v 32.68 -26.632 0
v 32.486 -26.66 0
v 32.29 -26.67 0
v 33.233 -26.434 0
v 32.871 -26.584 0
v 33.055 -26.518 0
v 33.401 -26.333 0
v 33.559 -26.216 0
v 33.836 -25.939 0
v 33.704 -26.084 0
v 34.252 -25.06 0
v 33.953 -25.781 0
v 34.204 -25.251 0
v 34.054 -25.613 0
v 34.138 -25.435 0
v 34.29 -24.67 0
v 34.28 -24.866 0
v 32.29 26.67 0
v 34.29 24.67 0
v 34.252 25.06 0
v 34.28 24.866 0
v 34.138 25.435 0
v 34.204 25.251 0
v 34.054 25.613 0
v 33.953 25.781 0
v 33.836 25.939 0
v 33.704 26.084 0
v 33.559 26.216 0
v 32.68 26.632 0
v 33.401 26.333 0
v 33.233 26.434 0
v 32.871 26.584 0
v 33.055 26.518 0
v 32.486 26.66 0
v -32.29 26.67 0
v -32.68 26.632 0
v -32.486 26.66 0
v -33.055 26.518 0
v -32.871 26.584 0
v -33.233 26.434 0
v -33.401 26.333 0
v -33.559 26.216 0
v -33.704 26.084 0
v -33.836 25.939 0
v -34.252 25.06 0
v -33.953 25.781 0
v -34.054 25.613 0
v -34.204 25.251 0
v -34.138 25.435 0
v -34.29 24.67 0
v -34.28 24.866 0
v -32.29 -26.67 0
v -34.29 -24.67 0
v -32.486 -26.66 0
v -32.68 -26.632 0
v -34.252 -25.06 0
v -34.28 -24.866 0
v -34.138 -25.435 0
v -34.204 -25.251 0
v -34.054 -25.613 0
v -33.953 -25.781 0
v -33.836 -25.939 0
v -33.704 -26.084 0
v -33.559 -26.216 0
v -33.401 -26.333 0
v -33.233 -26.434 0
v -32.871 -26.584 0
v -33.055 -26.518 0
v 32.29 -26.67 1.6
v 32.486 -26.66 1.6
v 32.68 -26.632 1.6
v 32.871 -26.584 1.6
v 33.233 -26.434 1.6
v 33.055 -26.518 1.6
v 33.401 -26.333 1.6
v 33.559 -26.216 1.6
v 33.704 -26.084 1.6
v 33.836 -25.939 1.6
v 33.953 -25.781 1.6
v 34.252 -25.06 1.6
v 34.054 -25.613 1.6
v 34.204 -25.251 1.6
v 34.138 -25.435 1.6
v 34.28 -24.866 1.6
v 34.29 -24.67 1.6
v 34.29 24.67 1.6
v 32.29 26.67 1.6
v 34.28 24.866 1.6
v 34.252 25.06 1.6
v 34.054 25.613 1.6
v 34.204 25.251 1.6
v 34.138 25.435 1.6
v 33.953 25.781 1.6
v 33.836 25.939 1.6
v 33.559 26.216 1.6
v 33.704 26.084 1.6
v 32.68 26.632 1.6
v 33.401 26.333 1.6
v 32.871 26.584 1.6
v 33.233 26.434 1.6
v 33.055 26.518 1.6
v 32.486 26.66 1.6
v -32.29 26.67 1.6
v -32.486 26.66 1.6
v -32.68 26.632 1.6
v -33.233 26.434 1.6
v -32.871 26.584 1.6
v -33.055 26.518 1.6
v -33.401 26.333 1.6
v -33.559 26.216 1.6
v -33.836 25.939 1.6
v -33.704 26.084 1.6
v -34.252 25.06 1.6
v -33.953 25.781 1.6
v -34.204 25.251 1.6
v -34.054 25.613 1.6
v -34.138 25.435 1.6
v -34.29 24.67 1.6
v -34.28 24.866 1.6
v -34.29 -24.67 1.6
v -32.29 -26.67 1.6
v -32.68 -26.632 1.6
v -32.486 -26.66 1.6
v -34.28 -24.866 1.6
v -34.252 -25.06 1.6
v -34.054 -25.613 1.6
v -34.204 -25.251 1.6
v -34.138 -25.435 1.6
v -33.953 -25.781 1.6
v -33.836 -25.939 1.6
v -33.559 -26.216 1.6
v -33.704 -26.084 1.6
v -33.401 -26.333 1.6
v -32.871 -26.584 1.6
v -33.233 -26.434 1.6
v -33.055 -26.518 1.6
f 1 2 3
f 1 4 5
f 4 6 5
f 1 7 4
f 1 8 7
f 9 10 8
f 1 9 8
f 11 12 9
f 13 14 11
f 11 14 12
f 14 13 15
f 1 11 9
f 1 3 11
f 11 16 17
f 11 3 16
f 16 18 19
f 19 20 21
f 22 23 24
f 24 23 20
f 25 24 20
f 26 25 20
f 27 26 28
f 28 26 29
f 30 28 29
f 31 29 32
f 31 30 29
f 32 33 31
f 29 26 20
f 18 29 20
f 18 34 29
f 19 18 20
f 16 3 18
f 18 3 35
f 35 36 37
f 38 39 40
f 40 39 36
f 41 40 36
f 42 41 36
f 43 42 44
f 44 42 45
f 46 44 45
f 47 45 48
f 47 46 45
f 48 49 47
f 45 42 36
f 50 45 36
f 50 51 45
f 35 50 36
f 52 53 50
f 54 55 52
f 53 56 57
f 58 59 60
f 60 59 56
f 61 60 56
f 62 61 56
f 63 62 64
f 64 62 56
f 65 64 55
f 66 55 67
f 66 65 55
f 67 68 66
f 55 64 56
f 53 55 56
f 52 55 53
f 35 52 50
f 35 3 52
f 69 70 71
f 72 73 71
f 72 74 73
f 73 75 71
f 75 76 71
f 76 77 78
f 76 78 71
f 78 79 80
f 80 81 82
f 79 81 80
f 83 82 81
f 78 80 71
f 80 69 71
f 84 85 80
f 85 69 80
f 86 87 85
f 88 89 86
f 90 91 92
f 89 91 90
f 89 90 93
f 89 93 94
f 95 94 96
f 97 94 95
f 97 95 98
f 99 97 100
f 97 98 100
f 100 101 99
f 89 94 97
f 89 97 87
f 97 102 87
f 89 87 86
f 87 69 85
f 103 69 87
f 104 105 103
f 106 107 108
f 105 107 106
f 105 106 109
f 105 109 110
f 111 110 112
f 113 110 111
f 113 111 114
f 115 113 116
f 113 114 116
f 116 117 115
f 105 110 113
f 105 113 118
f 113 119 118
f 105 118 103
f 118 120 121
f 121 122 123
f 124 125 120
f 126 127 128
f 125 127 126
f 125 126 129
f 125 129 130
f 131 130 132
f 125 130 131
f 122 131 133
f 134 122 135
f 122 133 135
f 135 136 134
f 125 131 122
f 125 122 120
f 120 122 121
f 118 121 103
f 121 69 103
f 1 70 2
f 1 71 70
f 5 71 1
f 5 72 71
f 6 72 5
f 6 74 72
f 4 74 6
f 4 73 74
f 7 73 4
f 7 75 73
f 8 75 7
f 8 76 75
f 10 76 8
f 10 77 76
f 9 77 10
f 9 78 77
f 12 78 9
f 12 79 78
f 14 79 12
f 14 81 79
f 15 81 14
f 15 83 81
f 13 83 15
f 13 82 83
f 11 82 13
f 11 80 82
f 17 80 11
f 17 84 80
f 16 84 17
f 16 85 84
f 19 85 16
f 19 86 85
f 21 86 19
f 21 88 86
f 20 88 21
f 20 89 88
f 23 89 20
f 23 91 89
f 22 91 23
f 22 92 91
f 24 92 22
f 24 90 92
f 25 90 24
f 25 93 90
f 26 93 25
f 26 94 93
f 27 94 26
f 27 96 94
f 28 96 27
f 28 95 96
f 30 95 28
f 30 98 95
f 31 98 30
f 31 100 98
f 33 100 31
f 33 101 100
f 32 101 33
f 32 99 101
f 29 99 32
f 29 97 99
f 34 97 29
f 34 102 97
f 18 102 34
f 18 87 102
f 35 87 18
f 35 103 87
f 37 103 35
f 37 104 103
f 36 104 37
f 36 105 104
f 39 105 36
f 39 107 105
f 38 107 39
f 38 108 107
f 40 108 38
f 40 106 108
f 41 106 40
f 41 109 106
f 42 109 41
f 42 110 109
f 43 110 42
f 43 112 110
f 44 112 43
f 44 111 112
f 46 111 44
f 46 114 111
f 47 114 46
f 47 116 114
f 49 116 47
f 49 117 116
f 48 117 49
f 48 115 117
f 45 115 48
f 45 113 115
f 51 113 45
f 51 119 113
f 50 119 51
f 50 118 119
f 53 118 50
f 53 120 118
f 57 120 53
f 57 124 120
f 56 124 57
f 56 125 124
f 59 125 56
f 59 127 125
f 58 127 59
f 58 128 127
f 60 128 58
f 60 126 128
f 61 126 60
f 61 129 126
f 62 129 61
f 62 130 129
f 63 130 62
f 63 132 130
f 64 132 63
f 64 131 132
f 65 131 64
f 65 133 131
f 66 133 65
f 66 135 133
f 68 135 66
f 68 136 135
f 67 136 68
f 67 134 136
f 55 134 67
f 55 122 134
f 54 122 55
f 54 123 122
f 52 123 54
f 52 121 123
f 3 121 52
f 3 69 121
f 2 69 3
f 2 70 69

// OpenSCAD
$fn = 64;

board_x = 68.58;
board_y = 53.34;
board_th = 1.6;

module dev_board(x=board_x, y=board_y, th=board_th, corner_r=2.0) {
    linear_extrude(height=th)
        offset(r=corner_r)
            square([x - 2*corner_r, y - 2*corner_r], center=true);
}

dev_board();
